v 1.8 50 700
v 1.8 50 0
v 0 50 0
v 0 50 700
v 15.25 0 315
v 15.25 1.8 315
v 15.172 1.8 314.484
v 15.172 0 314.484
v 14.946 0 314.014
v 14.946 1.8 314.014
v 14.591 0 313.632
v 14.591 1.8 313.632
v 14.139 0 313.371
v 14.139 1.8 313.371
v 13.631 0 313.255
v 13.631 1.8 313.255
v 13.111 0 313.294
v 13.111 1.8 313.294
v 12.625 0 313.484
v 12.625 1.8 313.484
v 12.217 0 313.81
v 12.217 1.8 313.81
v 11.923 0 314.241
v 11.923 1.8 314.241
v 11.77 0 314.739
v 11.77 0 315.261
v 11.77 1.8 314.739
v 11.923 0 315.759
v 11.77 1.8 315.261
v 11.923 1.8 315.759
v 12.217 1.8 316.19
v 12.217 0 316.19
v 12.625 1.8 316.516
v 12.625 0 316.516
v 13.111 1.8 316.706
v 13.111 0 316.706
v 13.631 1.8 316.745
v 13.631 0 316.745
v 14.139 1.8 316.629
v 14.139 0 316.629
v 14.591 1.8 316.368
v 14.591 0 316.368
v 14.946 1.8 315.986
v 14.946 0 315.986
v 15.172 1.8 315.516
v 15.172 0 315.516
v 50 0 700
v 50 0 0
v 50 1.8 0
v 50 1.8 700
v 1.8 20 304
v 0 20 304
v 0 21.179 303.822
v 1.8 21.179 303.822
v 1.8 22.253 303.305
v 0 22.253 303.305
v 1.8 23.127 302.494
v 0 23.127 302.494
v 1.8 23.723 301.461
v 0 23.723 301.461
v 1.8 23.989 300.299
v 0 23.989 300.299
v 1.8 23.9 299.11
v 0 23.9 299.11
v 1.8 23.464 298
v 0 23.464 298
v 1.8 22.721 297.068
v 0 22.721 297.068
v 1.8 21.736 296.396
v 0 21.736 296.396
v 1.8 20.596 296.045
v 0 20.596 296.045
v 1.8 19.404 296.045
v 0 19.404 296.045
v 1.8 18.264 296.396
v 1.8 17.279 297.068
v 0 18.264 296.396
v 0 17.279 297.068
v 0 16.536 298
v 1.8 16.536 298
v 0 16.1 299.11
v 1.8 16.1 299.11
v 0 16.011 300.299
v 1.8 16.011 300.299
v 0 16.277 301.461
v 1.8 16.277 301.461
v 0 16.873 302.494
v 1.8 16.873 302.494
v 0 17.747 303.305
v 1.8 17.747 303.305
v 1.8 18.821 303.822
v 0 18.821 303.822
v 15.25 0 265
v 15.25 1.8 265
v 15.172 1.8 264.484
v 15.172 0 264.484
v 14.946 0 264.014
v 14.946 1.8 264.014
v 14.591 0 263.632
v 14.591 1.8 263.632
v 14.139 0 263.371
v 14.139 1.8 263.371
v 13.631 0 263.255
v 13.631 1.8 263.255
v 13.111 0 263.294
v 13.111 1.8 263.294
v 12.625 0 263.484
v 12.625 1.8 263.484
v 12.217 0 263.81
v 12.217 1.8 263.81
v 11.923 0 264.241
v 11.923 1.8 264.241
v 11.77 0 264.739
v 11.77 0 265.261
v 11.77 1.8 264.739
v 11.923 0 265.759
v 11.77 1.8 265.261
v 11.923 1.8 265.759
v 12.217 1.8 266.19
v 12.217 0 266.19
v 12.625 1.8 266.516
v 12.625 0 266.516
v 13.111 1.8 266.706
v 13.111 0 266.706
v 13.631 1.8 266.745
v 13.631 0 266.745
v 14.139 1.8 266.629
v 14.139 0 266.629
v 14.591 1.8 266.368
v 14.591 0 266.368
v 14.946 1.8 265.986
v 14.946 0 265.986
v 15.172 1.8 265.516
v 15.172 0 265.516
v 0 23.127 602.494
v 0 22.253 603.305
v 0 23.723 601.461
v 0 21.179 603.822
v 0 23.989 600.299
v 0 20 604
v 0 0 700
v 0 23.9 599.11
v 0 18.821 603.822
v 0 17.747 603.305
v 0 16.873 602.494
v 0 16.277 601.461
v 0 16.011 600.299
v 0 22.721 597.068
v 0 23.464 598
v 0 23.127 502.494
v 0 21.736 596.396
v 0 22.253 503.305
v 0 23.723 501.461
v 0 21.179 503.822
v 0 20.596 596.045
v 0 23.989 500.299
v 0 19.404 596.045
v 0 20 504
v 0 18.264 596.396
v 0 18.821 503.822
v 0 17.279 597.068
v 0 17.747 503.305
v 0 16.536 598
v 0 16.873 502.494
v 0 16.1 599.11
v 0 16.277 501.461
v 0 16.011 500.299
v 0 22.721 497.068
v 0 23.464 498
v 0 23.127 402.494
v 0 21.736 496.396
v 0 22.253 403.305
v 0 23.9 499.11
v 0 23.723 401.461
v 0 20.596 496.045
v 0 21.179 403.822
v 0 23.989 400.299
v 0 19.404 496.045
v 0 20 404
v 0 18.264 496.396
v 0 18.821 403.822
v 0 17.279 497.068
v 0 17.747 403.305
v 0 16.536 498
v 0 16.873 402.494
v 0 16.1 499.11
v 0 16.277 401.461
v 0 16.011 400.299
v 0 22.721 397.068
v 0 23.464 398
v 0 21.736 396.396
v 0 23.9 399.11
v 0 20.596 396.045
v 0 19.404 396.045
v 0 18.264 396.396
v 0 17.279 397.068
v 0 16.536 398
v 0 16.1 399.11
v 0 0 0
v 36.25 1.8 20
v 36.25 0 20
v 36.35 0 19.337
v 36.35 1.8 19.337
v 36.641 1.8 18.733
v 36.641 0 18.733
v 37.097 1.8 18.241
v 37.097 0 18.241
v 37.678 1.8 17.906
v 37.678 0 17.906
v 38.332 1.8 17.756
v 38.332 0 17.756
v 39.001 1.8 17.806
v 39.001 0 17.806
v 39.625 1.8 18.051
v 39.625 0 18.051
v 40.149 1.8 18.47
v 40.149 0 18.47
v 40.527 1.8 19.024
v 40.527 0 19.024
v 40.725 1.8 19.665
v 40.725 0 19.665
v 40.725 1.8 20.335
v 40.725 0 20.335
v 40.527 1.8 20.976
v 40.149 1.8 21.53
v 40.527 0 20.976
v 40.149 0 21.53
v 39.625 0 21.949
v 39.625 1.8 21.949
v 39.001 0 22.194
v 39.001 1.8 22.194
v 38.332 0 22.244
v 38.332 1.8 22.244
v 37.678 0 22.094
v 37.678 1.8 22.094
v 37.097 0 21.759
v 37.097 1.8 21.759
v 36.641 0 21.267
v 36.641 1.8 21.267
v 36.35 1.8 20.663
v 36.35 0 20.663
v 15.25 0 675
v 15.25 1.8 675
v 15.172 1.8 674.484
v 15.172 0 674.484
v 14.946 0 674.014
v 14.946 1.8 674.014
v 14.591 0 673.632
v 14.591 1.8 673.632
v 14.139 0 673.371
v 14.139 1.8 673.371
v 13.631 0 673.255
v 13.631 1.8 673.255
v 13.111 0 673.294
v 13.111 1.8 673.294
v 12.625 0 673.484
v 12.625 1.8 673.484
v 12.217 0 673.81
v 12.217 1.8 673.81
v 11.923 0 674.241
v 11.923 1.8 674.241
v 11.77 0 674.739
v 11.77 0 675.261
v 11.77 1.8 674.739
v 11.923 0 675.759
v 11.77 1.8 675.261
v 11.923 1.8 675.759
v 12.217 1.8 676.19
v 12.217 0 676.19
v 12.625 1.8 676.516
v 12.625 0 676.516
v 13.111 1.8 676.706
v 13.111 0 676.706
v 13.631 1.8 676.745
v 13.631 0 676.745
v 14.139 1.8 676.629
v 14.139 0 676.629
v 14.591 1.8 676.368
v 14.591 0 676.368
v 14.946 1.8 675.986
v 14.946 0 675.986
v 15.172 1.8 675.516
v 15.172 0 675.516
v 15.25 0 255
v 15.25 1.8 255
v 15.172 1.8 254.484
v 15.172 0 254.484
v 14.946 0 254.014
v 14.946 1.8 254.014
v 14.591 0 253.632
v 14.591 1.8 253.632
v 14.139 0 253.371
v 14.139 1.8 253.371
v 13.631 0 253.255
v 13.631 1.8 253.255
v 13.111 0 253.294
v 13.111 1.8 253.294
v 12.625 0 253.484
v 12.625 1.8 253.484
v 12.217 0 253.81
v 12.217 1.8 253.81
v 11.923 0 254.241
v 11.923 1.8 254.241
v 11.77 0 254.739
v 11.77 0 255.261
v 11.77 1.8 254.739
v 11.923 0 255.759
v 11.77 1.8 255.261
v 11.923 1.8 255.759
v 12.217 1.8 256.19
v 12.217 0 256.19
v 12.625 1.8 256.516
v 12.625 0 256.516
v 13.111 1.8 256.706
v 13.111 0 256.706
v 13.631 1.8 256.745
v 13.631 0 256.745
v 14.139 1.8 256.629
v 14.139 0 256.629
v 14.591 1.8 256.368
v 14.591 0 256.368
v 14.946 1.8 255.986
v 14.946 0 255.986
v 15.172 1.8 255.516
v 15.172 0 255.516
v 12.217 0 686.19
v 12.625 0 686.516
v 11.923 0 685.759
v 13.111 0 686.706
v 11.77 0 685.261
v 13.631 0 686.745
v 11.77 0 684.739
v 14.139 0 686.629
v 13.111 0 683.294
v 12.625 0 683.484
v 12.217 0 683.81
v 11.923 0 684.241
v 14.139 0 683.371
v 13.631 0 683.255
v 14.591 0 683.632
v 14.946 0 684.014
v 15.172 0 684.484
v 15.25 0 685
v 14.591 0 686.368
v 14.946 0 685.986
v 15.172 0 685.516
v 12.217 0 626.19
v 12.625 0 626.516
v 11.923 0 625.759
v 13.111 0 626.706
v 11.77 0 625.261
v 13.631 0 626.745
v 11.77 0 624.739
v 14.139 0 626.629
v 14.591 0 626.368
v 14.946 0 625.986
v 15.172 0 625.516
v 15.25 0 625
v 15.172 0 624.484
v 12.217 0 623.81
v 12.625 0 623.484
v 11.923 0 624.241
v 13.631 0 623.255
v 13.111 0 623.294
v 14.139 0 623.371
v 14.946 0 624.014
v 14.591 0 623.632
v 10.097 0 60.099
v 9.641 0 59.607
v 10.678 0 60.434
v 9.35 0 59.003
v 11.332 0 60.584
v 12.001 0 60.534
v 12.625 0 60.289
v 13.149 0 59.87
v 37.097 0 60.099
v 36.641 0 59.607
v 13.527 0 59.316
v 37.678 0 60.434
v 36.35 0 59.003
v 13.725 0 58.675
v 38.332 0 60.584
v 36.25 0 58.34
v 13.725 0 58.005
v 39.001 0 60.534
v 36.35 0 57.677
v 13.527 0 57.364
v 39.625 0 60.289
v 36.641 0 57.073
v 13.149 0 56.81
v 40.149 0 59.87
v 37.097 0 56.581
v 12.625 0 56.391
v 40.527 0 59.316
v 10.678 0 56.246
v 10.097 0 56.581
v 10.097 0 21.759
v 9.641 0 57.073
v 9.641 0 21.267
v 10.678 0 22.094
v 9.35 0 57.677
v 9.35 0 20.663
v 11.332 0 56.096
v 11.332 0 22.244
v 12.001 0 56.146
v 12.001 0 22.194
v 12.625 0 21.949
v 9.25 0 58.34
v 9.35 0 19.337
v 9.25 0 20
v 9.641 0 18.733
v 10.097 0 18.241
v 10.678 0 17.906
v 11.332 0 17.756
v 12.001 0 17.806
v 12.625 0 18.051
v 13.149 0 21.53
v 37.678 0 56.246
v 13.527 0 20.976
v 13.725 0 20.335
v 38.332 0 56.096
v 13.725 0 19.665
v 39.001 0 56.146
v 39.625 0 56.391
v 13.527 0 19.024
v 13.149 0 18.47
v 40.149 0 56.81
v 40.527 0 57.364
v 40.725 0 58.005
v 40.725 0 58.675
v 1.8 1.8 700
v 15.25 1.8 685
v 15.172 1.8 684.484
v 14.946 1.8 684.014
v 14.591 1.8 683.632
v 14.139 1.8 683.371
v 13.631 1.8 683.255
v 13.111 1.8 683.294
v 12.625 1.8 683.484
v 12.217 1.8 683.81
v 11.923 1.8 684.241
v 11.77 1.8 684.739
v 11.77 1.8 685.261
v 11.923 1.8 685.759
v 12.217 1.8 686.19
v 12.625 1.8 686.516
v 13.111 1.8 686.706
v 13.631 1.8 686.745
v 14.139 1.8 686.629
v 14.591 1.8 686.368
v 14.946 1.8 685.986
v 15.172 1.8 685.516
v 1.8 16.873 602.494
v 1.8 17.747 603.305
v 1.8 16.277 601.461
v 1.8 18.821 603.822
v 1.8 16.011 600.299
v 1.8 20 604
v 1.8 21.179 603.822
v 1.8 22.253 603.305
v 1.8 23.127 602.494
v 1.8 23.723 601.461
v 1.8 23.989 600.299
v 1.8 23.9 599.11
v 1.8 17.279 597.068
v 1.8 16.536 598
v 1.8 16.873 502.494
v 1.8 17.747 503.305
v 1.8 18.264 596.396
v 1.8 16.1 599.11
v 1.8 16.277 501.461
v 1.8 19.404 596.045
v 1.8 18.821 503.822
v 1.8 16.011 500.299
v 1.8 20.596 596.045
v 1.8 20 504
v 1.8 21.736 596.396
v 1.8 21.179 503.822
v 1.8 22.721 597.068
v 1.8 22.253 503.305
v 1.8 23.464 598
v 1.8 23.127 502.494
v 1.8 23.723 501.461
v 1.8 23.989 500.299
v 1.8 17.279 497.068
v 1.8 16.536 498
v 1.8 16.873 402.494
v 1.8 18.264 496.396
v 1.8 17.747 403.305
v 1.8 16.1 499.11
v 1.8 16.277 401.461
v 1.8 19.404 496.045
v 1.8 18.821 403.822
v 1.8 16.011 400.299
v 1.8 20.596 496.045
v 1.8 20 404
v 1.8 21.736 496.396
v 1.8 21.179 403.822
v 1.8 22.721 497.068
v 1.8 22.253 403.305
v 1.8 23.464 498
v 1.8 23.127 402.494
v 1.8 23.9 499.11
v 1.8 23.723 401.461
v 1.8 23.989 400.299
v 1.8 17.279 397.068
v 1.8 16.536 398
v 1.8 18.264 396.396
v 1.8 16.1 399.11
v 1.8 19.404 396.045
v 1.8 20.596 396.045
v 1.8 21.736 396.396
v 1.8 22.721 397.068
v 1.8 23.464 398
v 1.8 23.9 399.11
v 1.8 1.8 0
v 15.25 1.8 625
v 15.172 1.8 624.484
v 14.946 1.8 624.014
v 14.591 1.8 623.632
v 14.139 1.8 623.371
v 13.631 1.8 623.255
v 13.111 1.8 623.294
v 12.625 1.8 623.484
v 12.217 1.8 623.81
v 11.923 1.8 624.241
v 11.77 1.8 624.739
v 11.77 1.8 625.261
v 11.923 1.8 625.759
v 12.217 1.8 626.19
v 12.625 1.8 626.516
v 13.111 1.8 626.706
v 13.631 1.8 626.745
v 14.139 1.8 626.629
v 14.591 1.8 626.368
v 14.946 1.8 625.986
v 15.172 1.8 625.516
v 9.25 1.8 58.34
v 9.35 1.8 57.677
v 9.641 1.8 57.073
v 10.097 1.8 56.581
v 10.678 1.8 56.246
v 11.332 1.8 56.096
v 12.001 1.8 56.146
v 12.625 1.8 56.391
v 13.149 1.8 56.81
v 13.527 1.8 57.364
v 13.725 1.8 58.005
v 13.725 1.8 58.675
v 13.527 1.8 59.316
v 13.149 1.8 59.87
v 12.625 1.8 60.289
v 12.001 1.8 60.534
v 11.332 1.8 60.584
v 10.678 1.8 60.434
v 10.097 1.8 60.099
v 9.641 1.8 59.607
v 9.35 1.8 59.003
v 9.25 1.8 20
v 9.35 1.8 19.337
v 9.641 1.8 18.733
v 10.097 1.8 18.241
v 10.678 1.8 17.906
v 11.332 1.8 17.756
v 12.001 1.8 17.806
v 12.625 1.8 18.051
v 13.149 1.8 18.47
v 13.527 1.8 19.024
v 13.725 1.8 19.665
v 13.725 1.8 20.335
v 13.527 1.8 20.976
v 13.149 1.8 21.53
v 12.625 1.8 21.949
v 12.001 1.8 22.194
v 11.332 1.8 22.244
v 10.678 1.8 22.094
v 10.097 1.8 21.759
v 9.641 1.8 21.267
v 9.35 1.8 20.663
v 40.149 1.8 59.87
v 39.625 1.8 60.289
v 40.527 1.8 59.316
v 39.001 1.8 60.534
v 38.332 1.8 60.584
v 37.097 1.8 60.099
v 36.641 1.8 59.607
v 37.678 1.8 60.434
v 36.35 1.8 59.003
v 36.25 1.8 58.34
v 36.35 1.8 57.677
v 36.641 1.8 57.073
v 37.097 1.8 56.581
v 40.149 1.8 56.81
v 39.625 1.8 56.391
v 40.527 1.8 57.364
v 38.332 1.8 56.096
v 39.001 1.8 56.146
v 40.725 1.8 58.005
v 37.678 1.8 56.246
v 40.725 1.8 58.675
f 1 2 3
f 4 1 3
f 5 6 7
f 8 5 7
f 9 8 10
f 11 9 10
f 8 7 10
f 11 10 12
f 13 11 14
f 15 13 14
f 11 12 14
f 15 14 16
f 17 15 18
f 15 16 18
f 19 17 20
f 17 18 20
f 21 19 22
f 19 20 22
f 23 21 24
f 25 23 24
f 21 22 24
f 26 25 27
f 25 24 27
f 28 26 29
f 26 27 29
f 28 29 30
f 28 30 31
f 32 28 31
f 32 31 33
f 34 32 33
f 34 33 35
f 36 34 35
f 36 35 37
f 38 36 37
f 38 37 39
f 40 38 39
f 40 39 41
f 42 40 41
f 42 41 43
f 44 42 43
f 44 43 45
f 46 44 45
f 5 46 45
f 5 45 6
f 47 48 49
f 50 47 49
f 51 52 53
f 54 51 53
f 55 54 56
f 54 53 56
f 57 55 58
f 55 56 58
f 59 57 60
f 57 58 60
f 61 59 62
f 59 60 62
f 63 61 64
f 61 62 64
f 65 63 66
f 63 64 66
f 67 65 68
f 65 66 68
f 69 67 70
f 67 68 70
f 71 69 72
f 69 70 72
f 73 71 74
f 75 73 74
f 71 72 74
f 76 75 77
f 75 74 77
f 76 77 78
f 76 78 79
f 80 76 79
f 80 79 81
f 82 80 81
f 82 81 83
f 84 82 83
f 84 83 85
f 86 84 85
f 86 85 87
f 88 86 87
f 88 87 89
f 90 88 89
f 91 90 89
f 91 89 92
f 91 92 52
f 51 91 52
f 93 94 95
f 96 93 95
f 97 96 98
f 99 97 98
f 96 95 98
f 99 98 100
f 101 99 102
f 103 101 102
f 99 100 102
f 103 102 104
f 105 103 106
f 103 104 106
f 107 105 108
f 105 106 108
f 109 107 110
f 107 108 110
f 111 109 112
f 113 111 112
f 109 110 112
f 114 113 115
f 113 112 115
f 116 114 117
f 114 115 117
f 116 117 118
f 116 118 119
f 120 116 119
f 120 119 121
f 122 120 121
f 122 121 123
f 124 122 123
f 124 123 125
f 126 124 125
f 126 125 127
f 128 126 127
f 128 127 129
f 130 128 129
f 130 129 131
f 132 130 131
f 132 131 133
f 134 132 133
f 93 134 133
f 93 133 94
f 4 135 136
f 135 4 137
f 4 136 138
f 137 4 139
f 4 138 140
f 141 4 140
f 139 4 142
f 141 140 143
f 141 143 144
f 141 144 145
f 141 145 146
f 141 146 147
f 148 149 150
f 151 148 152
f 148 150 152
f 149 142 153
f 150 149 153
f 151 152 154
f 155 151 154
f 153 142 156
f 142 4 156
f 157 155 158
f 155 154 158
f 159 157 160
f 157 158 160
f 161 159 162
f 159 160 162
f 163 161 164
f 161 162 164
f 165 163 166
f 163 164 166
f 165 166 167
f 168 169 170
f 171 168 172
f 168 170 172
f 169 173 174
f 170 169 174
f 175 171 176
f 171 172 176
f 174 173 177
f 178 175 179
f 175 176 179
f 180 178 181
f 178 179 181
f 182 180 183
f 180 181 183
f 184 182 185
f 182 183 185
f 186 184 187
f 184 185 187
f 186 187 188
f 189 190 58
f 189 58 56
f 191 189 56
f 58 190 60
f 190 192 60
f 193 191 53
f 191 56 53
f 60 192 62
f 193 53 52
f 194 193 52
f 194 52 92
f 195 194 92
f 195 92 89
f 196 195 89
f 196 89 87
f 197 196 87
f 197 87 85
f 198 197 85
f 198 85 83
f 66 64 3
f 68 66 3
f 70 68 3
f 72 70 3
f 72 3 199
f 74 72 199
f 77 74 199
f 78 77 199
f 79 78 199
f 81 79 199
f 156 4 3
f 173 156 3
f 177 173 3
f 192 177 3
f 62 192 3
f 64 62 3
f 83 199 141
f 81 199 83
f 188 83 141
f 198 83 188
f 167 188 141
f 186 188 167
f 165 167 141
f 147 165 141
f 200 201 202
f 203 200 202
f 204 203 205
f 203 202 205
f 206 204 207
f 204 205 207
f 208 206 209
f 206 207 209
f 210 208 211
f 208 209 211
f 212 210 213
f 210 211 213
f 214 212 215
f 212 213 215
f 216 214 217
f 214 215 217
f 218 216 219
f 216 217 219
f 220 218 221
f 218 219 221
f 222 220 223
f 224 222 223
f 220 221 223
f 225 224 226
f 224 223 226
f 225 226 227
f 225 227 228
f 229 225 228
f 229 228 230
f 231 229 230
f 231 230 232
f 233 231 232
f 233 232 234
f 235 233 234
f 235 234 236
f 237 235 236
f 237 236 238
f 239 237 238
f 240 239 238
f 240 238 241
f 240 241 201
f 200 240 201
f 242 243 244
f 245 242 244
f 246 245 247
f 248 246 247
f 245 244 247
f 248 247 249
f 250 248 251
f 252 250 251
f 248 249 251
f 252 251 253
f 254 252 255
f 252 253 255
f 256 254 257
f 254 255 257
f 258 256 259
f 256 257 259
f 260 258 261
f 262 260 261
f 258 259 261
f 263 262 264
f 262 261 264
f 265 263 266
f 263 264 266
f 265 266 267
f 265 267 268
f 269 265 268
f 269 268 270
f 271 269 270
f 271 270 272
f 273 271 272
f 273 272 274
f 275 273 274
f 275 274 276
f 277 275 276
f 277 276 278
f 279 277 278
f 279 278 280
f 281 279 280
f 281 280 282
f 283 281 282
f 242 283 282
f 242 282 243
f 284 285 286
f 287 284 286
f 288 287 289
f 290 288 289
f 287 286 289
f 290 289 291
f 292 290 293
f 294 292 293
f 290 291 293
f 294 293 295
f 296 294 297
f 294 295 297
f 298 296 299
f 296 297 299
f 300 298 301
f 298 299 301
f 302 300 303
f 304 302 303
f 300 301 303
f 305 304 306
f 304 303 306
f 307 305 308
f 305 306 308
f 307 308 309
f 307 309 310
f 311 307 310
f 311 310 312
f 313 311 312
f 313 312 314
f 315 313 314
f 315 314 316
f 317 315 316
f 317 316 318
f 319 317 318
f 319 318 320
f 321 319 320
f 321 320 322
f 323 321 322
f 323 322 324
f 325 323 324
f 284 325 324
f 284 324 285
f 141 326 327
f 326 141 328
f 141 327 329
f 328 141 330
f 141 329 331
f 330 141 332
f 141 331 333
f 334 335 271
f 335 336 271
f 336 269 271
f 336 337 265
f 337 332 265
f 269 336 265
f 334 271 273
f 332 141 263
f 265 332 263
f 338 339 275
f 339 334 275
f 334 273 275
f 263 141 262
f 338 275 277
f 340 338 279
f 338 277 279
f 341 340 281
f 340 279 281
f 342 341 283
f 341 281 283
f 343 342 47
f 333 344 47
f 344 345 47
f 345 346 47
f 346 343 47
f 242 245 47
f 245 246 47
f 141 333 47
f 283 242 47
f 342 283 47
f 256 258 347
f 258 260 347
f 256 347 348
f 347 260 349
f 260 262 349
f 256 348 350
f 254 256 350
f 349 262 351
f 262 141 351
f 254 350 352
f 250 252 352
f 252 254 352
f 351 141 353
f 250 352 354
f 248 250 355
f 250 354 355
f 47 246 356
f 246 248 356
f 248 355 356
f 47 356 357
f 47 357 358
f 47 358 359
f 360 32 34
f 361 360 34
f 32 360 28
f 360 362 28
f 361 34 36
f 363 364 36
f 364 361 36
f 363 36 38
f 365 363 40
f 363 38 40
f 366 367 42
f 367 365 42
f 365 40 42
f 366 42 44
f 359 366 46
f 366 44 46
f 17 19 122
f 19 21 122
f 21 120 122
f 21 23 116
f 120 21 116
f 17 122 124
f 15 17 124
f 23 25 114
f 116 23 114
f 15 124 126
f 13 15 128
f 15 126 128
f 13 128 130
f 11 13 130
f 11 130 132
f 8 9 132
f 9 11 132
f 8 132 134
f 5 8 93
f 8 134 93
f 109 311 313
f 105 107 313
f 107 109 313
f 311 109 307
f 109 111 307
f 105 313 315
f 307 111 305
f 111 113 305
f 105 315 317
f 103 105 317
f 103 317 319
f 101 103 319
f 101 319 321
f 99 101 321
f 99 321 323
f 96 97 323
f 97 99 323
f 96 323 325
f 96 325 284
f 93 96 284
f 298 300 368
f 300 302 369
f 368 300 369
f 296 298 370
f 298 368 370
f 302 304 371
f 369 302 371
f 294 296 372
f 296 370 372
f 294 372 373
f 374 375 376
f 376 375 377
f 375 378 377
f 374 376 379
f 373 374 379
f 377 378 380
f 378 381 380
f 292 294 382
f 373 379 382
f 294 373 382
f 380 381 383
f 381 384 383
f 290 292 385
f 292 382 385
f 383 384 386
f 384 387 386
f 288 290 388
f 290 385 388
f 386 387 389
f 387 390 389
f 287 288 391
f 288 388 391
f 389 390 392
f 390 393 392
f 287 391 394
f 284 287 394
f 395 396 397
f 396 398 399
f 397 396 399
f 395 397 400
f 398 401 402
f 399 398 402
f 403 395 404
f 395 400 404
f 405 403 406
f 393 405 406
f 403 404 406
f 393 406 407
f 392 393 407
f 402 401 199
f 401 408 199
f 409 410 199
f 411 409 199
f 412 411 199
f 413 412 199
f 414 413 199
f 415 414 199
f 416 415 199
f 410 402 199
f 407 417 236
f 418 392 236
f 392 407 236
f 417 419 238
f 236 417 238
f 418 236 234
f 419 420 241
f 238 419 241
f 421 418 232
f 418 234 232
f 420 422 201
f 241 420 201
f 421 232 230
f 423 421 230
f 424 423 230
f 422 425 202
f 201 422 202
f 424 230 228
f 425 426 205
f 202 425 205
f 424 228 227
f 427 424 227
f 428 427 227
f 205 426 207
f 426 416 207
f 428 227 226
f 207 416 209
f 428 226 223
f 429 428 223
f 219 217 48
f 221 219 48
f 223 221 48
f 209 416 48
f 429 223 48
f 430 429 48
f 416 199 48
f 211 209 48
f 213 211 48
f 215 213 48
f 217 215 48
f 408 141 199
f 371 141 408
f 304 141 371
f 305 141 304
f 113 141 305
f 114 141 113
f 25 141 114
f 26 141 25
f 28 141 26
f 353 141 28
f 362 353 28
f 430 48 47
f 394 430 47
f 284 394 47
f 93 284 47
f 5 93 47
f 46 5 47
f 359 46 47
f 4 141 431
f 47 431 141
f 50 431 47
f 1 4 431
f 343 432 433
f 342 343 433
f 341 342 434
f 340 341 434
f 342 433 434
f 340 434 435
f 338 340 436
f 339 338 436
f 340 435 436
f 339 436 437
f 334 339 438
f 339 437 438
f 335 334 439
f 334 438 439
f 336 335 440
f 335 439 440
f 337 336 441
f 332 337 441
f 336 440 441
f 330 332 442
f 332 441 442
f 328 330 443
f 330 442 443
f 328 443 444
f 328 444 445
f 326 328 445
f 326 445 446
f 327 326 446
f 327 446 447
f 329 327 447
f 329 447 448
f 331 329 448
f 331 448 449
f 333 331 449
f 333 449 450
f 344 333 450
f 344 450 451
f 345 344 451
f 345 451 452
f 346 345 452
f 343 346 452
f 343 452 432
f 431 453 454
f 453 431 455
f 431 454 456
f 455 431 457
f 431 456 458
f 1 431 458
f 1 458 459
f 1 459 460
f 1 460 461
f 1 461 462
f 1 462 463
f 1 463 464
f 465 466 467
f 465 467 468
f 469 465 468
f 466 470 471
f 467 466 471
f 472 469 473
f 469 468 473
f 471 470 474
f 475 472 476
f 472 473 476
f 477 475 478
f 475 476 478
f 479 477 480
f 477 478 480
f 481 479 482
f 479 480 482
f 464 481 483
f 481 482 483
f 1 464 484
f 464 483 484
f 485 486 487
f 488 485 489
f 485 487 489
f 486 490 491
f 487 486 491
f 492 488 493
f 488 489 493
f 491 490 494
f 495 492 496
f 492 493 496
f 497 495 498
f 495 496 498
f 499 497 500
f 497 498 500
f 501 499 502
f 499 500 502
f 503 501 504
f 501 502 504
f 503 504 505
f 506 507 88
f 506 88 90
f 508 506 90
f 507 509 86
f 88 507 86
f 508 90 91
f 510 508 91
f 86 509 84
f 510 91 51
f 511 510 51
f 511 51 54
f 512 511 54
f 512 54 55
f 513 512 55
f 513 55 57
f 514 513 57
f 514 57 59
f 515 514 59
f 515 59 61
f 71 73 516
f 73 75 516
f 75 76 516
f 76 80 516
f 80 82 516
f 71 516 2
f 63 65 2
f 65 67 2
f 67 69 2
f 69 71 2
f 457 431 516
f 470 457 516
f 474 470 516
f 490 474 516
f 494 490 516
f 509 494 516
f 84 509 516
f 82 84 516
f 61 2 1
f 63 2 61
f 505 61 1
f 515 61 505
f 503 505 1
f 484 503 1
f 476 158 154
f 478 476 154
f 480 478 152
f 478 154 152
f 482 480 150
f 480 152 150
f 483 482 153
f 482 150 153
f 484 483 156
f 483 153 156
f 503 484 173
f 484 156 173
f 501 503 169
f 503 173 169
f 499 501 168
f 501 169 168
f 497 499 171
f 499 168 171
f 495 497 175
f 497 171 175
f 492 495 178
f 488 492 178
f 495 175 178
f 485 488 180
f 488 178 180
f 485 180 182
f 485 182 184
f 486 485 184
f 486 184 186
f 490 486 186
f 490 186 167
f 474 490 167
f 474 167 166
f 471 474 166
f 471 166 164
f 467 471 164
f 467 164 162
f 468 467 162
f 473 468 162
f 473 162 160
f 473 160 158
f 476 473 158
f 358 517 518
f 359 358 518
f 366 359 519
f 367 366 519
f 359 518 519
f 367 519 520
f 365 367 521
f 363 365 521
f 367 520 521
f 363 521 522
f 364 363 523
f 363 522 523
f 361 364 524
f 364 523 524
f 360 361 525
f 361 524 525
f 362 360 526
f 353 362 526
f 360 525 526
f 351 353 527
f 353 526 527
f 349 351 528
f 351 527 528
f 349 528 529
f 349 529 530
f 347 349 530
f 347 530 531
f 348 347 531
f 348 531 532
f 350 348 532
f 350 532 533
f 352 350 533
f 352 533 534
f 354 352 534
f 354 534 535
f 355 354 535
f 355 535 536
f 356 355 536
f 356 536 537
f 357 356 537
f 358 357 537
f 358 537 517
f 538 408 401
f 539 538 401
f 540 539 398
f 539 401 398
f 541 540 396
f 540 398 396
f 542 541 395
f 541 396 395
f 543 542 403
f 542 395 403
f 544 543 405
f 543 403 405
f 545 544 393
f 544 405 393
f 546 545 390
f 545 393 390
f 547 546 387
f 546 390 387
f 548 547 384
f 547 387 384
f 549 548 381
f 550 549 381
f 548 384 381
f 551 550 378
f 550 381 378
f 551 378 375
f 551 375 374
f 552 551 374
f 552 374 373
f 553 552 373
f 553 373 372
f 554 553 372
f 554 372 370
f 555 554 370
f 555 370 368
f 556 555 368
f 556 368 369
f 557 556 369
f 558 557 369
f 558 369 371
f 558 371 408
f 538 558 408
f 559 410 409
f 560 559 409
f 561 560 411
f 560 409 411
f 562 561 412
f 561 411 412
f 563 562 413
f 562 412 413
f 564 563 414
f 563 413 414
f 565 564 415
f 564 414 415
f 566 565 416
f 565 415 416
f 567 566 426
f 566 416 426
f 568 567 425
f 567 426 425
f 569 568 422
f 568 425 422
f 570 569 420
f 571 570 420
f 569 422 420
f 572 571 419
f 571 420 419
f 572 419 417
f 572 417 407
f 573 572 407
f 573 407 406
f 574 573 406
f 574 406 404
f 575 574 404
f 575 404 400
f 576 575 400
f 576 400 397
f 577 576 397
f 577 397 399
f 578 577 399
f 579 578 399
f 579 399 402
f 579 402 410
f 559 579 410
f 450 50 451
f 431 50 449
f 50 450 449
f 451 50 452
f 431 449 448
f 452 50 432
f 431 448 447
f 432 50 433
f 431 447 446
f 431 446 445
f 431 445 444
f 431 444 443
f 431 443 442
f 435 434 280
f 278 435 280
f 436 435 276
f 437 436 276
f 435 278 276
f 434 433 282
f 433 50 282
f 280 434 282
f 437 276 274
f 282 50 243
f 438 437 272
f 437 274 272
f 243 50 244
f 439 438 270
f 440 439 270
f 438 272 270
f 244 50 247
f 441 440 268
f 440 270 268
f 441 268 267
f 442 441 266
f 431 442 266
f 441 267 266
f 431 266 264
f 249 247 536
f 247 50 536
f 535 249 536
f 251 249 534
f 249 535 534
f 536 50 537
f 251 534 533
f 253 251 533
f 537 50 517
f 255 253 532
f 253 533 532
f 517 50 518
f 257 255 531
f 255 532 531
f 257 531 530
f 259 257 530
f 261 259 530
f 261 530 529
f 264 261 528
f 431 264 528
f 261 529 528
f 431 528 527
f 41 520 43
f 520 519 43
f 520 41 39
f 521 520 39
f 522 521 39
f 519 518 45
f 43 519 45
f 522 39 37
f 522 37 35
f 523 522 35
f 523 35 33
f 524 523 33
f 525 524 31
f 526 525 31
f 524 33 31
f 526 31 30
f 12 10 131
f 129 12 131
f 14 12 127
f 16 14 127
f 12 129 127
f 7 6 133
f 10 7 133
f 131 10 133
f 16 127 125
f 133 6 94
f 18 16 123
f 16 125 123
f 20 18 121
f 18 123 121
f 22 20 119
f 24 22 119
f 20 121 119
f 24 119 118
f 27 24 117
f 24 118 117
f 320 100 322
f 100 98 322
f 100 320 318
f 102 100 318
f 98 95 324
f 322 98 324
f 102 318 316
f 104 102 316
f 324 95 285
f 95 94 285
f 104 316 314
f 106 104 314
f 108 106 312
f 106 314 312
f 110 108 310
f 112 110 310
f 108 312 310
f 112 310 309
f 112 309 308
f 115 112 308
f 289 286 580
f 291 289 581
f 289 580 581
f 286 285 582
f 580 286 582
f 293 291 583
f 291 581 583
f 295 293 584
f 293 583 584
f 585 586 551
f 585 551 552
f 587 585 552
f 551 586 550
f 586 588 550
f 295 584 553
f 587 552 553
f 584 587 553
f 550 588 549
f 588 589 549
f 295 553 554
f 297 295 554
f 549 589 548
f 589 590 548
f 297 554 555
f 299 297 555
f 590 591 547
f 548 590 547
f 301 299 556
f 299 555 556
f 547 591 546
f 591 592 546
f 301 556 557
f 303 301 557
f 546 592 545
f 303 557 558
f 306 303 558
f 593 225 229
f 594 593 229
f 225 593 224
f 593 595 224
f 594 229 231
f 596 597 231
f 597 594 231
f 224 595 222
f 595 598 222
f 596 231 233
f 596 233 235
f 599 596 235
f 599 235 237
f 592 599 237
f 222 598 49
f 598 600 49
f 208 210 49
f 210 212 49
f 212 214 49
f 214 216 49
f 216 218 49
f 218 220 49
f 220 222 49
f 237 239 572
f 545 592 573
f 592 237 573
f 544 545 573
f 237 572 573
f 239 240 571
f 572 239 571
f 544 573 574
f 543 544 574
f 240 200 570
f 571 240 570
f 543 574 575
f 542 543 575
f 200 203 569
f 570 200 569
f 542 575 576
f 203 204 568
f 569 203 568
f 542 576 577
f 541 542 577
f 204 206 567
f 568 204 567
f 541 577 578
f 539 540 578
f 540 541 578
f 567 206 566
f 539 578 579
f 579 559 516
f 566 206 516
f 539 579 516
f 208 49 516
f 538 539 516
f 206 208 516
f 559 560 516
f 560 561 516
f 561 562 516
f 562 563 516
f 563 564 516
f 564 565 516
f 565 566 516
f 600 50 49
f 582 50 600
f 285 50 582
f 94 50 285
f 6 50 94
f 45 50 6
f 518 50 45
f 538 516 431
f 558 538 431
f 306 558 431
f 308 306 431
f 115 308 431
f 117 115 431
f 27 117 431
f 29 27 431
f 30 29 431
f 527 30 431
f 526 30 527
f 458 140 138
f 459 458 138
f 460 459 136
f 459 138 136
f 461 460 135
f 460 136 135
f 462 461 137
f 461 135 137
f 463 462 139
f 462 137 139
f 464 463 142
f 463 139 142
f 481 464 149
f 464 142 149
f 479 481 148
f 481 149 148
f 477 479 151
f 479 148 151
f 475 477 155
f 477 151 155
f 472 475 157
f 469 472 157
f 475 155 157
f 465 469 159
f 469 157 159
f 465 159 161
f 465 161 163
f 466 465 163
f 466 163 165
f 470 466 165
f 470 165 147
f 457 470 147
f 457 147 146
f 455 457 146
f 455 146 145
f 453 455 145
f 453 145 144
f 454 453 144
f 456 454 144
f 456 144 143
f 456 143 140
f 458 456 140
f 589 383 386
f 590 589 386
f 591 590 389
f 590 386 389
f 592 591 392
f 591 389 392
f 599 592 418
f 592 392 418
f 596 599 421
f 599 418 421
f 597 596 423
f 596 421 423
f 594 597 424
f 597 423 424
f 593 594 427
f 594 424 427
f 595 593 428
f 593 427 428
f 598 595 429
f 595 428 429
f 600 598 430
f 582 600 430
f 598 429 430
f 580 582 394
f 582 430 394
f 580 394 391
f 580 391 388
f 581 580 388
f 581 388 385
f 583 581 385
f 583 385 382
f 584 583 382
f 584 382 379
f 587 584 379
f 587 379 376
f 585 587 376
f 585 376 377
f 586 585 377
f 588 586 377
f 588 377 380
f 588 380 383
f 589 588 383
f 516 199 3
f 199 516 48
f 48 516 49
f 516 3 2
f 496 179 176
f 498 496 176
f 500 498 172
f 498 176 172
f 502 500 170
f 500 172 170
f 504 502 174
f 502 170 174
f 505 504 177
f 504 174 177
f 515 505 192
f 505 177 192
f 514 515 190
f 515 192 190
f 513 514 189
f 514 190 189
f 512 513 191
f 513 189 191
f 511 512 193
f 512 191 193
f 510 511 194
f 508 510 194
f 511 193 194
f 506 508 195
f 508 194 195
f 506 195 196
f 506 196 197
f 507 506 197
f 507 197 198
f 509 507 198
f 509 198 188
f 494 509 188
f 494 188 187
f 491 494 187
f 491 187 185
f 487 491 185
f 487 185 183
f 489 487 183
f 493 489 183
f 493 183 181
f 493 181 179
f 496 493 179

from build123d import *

# Parameters (mm, degrees)
EXTRUDE_1_DEPTH             = 700
SKETCH_2_R                  = 2.25
CUT_EXTRUDE_1_DEPTH         = 10
SKETCH_3_R                  = 4
CUT_EXTRUDE_2_DEPTH         = 51
HOLE_WIZARD_3_5_3_5_1_D     = 3.5
HOLE_WIZARD_3_5_3_5_1_DEPTH = 2
HOLE_WIZARD_3_5_3_5_1_TIP   = 1.051506083


with BuildPart() as part:
    # 草圖1 → 填料-伸長1 (new body)
    with BuildSketch(Plane.XY):
        Polygon((0, 50), (0, 0), (50, 0), (50, 1.8), (1.8, 1.8), (1.8, 50), align=None)
    extrude(amount=EXTRUDE_1_DEPTH)

    # 草圖2 → 除料-伸長1 (cut)
    with BuildSketch(Plane(origin=(0, 0, 0), x_dir=(-1, 0, 0), z_dir=(0, -1, 0))):
        with Locations((-38.5, -20)):
            Circle(SKETCH_2_R)
        with Locations((-38.5, -58.34)):
            Circle(SKETCH_2_R)
        with Locations((-11.5, -20)):
            Circle(SKETCH_2_R)
        with Locations((-11.5, -58.34)):
            Circle(SKETCH_2_R)
    extrude(amount=-CUT_EXTRUDE_1_DEPTH, mode=Mode.SUBTRACT)

    # 草圖3 → 除料-伸長2 (cut, through all)
    with BuildSketch(Plane.ZY):
        with Locations((600, 20)):
            Circle(SKETCH_3_R)
        with Locations((500, 20)):
            Circle(SKETCH_3_R)
        with Locations((400, 20)):
            Circle(SKETCH_3_R)
        with Locations((300, 20)):
            Circle(SKETCH_3_R)
    extrude(amount=-CUT_EXTRUDE_2_DEPTH, mode=Mode.SUBTRACT)

    # Ø3.5 (3.5) 直徑孔1
    with Locations(Plane(origin=(0, 0, 0), x_dir=(-1, 0, 0), z_dir=(0, -1, 0))):
        with Locations((-13.5, -685), (-13.5, -675), (-13.5, -625), (-13.5, -255), (-13.5, -265), (-13.5, -315)):
            Hole(HOLE_WIZARD_3_5_3_5_1_D / 2, depth=HOLE_WIZARD_3_5_3_5_1_DEPTH)
            with Locations((0, 0, -(HOLE_WIZARD_3_5_3_5_1_DEPTH + HOLE_WIZARD_3_5_3_5_1_TIP / 2))):  # 118° drill point
                Cone(0, HOLE_WIZARD_3_5_3_5_1_D / 2, HOLE_WIZARD_3_5_3_5_1_TIP, mode=Mode.SUBTRACT)


solid = part.part
